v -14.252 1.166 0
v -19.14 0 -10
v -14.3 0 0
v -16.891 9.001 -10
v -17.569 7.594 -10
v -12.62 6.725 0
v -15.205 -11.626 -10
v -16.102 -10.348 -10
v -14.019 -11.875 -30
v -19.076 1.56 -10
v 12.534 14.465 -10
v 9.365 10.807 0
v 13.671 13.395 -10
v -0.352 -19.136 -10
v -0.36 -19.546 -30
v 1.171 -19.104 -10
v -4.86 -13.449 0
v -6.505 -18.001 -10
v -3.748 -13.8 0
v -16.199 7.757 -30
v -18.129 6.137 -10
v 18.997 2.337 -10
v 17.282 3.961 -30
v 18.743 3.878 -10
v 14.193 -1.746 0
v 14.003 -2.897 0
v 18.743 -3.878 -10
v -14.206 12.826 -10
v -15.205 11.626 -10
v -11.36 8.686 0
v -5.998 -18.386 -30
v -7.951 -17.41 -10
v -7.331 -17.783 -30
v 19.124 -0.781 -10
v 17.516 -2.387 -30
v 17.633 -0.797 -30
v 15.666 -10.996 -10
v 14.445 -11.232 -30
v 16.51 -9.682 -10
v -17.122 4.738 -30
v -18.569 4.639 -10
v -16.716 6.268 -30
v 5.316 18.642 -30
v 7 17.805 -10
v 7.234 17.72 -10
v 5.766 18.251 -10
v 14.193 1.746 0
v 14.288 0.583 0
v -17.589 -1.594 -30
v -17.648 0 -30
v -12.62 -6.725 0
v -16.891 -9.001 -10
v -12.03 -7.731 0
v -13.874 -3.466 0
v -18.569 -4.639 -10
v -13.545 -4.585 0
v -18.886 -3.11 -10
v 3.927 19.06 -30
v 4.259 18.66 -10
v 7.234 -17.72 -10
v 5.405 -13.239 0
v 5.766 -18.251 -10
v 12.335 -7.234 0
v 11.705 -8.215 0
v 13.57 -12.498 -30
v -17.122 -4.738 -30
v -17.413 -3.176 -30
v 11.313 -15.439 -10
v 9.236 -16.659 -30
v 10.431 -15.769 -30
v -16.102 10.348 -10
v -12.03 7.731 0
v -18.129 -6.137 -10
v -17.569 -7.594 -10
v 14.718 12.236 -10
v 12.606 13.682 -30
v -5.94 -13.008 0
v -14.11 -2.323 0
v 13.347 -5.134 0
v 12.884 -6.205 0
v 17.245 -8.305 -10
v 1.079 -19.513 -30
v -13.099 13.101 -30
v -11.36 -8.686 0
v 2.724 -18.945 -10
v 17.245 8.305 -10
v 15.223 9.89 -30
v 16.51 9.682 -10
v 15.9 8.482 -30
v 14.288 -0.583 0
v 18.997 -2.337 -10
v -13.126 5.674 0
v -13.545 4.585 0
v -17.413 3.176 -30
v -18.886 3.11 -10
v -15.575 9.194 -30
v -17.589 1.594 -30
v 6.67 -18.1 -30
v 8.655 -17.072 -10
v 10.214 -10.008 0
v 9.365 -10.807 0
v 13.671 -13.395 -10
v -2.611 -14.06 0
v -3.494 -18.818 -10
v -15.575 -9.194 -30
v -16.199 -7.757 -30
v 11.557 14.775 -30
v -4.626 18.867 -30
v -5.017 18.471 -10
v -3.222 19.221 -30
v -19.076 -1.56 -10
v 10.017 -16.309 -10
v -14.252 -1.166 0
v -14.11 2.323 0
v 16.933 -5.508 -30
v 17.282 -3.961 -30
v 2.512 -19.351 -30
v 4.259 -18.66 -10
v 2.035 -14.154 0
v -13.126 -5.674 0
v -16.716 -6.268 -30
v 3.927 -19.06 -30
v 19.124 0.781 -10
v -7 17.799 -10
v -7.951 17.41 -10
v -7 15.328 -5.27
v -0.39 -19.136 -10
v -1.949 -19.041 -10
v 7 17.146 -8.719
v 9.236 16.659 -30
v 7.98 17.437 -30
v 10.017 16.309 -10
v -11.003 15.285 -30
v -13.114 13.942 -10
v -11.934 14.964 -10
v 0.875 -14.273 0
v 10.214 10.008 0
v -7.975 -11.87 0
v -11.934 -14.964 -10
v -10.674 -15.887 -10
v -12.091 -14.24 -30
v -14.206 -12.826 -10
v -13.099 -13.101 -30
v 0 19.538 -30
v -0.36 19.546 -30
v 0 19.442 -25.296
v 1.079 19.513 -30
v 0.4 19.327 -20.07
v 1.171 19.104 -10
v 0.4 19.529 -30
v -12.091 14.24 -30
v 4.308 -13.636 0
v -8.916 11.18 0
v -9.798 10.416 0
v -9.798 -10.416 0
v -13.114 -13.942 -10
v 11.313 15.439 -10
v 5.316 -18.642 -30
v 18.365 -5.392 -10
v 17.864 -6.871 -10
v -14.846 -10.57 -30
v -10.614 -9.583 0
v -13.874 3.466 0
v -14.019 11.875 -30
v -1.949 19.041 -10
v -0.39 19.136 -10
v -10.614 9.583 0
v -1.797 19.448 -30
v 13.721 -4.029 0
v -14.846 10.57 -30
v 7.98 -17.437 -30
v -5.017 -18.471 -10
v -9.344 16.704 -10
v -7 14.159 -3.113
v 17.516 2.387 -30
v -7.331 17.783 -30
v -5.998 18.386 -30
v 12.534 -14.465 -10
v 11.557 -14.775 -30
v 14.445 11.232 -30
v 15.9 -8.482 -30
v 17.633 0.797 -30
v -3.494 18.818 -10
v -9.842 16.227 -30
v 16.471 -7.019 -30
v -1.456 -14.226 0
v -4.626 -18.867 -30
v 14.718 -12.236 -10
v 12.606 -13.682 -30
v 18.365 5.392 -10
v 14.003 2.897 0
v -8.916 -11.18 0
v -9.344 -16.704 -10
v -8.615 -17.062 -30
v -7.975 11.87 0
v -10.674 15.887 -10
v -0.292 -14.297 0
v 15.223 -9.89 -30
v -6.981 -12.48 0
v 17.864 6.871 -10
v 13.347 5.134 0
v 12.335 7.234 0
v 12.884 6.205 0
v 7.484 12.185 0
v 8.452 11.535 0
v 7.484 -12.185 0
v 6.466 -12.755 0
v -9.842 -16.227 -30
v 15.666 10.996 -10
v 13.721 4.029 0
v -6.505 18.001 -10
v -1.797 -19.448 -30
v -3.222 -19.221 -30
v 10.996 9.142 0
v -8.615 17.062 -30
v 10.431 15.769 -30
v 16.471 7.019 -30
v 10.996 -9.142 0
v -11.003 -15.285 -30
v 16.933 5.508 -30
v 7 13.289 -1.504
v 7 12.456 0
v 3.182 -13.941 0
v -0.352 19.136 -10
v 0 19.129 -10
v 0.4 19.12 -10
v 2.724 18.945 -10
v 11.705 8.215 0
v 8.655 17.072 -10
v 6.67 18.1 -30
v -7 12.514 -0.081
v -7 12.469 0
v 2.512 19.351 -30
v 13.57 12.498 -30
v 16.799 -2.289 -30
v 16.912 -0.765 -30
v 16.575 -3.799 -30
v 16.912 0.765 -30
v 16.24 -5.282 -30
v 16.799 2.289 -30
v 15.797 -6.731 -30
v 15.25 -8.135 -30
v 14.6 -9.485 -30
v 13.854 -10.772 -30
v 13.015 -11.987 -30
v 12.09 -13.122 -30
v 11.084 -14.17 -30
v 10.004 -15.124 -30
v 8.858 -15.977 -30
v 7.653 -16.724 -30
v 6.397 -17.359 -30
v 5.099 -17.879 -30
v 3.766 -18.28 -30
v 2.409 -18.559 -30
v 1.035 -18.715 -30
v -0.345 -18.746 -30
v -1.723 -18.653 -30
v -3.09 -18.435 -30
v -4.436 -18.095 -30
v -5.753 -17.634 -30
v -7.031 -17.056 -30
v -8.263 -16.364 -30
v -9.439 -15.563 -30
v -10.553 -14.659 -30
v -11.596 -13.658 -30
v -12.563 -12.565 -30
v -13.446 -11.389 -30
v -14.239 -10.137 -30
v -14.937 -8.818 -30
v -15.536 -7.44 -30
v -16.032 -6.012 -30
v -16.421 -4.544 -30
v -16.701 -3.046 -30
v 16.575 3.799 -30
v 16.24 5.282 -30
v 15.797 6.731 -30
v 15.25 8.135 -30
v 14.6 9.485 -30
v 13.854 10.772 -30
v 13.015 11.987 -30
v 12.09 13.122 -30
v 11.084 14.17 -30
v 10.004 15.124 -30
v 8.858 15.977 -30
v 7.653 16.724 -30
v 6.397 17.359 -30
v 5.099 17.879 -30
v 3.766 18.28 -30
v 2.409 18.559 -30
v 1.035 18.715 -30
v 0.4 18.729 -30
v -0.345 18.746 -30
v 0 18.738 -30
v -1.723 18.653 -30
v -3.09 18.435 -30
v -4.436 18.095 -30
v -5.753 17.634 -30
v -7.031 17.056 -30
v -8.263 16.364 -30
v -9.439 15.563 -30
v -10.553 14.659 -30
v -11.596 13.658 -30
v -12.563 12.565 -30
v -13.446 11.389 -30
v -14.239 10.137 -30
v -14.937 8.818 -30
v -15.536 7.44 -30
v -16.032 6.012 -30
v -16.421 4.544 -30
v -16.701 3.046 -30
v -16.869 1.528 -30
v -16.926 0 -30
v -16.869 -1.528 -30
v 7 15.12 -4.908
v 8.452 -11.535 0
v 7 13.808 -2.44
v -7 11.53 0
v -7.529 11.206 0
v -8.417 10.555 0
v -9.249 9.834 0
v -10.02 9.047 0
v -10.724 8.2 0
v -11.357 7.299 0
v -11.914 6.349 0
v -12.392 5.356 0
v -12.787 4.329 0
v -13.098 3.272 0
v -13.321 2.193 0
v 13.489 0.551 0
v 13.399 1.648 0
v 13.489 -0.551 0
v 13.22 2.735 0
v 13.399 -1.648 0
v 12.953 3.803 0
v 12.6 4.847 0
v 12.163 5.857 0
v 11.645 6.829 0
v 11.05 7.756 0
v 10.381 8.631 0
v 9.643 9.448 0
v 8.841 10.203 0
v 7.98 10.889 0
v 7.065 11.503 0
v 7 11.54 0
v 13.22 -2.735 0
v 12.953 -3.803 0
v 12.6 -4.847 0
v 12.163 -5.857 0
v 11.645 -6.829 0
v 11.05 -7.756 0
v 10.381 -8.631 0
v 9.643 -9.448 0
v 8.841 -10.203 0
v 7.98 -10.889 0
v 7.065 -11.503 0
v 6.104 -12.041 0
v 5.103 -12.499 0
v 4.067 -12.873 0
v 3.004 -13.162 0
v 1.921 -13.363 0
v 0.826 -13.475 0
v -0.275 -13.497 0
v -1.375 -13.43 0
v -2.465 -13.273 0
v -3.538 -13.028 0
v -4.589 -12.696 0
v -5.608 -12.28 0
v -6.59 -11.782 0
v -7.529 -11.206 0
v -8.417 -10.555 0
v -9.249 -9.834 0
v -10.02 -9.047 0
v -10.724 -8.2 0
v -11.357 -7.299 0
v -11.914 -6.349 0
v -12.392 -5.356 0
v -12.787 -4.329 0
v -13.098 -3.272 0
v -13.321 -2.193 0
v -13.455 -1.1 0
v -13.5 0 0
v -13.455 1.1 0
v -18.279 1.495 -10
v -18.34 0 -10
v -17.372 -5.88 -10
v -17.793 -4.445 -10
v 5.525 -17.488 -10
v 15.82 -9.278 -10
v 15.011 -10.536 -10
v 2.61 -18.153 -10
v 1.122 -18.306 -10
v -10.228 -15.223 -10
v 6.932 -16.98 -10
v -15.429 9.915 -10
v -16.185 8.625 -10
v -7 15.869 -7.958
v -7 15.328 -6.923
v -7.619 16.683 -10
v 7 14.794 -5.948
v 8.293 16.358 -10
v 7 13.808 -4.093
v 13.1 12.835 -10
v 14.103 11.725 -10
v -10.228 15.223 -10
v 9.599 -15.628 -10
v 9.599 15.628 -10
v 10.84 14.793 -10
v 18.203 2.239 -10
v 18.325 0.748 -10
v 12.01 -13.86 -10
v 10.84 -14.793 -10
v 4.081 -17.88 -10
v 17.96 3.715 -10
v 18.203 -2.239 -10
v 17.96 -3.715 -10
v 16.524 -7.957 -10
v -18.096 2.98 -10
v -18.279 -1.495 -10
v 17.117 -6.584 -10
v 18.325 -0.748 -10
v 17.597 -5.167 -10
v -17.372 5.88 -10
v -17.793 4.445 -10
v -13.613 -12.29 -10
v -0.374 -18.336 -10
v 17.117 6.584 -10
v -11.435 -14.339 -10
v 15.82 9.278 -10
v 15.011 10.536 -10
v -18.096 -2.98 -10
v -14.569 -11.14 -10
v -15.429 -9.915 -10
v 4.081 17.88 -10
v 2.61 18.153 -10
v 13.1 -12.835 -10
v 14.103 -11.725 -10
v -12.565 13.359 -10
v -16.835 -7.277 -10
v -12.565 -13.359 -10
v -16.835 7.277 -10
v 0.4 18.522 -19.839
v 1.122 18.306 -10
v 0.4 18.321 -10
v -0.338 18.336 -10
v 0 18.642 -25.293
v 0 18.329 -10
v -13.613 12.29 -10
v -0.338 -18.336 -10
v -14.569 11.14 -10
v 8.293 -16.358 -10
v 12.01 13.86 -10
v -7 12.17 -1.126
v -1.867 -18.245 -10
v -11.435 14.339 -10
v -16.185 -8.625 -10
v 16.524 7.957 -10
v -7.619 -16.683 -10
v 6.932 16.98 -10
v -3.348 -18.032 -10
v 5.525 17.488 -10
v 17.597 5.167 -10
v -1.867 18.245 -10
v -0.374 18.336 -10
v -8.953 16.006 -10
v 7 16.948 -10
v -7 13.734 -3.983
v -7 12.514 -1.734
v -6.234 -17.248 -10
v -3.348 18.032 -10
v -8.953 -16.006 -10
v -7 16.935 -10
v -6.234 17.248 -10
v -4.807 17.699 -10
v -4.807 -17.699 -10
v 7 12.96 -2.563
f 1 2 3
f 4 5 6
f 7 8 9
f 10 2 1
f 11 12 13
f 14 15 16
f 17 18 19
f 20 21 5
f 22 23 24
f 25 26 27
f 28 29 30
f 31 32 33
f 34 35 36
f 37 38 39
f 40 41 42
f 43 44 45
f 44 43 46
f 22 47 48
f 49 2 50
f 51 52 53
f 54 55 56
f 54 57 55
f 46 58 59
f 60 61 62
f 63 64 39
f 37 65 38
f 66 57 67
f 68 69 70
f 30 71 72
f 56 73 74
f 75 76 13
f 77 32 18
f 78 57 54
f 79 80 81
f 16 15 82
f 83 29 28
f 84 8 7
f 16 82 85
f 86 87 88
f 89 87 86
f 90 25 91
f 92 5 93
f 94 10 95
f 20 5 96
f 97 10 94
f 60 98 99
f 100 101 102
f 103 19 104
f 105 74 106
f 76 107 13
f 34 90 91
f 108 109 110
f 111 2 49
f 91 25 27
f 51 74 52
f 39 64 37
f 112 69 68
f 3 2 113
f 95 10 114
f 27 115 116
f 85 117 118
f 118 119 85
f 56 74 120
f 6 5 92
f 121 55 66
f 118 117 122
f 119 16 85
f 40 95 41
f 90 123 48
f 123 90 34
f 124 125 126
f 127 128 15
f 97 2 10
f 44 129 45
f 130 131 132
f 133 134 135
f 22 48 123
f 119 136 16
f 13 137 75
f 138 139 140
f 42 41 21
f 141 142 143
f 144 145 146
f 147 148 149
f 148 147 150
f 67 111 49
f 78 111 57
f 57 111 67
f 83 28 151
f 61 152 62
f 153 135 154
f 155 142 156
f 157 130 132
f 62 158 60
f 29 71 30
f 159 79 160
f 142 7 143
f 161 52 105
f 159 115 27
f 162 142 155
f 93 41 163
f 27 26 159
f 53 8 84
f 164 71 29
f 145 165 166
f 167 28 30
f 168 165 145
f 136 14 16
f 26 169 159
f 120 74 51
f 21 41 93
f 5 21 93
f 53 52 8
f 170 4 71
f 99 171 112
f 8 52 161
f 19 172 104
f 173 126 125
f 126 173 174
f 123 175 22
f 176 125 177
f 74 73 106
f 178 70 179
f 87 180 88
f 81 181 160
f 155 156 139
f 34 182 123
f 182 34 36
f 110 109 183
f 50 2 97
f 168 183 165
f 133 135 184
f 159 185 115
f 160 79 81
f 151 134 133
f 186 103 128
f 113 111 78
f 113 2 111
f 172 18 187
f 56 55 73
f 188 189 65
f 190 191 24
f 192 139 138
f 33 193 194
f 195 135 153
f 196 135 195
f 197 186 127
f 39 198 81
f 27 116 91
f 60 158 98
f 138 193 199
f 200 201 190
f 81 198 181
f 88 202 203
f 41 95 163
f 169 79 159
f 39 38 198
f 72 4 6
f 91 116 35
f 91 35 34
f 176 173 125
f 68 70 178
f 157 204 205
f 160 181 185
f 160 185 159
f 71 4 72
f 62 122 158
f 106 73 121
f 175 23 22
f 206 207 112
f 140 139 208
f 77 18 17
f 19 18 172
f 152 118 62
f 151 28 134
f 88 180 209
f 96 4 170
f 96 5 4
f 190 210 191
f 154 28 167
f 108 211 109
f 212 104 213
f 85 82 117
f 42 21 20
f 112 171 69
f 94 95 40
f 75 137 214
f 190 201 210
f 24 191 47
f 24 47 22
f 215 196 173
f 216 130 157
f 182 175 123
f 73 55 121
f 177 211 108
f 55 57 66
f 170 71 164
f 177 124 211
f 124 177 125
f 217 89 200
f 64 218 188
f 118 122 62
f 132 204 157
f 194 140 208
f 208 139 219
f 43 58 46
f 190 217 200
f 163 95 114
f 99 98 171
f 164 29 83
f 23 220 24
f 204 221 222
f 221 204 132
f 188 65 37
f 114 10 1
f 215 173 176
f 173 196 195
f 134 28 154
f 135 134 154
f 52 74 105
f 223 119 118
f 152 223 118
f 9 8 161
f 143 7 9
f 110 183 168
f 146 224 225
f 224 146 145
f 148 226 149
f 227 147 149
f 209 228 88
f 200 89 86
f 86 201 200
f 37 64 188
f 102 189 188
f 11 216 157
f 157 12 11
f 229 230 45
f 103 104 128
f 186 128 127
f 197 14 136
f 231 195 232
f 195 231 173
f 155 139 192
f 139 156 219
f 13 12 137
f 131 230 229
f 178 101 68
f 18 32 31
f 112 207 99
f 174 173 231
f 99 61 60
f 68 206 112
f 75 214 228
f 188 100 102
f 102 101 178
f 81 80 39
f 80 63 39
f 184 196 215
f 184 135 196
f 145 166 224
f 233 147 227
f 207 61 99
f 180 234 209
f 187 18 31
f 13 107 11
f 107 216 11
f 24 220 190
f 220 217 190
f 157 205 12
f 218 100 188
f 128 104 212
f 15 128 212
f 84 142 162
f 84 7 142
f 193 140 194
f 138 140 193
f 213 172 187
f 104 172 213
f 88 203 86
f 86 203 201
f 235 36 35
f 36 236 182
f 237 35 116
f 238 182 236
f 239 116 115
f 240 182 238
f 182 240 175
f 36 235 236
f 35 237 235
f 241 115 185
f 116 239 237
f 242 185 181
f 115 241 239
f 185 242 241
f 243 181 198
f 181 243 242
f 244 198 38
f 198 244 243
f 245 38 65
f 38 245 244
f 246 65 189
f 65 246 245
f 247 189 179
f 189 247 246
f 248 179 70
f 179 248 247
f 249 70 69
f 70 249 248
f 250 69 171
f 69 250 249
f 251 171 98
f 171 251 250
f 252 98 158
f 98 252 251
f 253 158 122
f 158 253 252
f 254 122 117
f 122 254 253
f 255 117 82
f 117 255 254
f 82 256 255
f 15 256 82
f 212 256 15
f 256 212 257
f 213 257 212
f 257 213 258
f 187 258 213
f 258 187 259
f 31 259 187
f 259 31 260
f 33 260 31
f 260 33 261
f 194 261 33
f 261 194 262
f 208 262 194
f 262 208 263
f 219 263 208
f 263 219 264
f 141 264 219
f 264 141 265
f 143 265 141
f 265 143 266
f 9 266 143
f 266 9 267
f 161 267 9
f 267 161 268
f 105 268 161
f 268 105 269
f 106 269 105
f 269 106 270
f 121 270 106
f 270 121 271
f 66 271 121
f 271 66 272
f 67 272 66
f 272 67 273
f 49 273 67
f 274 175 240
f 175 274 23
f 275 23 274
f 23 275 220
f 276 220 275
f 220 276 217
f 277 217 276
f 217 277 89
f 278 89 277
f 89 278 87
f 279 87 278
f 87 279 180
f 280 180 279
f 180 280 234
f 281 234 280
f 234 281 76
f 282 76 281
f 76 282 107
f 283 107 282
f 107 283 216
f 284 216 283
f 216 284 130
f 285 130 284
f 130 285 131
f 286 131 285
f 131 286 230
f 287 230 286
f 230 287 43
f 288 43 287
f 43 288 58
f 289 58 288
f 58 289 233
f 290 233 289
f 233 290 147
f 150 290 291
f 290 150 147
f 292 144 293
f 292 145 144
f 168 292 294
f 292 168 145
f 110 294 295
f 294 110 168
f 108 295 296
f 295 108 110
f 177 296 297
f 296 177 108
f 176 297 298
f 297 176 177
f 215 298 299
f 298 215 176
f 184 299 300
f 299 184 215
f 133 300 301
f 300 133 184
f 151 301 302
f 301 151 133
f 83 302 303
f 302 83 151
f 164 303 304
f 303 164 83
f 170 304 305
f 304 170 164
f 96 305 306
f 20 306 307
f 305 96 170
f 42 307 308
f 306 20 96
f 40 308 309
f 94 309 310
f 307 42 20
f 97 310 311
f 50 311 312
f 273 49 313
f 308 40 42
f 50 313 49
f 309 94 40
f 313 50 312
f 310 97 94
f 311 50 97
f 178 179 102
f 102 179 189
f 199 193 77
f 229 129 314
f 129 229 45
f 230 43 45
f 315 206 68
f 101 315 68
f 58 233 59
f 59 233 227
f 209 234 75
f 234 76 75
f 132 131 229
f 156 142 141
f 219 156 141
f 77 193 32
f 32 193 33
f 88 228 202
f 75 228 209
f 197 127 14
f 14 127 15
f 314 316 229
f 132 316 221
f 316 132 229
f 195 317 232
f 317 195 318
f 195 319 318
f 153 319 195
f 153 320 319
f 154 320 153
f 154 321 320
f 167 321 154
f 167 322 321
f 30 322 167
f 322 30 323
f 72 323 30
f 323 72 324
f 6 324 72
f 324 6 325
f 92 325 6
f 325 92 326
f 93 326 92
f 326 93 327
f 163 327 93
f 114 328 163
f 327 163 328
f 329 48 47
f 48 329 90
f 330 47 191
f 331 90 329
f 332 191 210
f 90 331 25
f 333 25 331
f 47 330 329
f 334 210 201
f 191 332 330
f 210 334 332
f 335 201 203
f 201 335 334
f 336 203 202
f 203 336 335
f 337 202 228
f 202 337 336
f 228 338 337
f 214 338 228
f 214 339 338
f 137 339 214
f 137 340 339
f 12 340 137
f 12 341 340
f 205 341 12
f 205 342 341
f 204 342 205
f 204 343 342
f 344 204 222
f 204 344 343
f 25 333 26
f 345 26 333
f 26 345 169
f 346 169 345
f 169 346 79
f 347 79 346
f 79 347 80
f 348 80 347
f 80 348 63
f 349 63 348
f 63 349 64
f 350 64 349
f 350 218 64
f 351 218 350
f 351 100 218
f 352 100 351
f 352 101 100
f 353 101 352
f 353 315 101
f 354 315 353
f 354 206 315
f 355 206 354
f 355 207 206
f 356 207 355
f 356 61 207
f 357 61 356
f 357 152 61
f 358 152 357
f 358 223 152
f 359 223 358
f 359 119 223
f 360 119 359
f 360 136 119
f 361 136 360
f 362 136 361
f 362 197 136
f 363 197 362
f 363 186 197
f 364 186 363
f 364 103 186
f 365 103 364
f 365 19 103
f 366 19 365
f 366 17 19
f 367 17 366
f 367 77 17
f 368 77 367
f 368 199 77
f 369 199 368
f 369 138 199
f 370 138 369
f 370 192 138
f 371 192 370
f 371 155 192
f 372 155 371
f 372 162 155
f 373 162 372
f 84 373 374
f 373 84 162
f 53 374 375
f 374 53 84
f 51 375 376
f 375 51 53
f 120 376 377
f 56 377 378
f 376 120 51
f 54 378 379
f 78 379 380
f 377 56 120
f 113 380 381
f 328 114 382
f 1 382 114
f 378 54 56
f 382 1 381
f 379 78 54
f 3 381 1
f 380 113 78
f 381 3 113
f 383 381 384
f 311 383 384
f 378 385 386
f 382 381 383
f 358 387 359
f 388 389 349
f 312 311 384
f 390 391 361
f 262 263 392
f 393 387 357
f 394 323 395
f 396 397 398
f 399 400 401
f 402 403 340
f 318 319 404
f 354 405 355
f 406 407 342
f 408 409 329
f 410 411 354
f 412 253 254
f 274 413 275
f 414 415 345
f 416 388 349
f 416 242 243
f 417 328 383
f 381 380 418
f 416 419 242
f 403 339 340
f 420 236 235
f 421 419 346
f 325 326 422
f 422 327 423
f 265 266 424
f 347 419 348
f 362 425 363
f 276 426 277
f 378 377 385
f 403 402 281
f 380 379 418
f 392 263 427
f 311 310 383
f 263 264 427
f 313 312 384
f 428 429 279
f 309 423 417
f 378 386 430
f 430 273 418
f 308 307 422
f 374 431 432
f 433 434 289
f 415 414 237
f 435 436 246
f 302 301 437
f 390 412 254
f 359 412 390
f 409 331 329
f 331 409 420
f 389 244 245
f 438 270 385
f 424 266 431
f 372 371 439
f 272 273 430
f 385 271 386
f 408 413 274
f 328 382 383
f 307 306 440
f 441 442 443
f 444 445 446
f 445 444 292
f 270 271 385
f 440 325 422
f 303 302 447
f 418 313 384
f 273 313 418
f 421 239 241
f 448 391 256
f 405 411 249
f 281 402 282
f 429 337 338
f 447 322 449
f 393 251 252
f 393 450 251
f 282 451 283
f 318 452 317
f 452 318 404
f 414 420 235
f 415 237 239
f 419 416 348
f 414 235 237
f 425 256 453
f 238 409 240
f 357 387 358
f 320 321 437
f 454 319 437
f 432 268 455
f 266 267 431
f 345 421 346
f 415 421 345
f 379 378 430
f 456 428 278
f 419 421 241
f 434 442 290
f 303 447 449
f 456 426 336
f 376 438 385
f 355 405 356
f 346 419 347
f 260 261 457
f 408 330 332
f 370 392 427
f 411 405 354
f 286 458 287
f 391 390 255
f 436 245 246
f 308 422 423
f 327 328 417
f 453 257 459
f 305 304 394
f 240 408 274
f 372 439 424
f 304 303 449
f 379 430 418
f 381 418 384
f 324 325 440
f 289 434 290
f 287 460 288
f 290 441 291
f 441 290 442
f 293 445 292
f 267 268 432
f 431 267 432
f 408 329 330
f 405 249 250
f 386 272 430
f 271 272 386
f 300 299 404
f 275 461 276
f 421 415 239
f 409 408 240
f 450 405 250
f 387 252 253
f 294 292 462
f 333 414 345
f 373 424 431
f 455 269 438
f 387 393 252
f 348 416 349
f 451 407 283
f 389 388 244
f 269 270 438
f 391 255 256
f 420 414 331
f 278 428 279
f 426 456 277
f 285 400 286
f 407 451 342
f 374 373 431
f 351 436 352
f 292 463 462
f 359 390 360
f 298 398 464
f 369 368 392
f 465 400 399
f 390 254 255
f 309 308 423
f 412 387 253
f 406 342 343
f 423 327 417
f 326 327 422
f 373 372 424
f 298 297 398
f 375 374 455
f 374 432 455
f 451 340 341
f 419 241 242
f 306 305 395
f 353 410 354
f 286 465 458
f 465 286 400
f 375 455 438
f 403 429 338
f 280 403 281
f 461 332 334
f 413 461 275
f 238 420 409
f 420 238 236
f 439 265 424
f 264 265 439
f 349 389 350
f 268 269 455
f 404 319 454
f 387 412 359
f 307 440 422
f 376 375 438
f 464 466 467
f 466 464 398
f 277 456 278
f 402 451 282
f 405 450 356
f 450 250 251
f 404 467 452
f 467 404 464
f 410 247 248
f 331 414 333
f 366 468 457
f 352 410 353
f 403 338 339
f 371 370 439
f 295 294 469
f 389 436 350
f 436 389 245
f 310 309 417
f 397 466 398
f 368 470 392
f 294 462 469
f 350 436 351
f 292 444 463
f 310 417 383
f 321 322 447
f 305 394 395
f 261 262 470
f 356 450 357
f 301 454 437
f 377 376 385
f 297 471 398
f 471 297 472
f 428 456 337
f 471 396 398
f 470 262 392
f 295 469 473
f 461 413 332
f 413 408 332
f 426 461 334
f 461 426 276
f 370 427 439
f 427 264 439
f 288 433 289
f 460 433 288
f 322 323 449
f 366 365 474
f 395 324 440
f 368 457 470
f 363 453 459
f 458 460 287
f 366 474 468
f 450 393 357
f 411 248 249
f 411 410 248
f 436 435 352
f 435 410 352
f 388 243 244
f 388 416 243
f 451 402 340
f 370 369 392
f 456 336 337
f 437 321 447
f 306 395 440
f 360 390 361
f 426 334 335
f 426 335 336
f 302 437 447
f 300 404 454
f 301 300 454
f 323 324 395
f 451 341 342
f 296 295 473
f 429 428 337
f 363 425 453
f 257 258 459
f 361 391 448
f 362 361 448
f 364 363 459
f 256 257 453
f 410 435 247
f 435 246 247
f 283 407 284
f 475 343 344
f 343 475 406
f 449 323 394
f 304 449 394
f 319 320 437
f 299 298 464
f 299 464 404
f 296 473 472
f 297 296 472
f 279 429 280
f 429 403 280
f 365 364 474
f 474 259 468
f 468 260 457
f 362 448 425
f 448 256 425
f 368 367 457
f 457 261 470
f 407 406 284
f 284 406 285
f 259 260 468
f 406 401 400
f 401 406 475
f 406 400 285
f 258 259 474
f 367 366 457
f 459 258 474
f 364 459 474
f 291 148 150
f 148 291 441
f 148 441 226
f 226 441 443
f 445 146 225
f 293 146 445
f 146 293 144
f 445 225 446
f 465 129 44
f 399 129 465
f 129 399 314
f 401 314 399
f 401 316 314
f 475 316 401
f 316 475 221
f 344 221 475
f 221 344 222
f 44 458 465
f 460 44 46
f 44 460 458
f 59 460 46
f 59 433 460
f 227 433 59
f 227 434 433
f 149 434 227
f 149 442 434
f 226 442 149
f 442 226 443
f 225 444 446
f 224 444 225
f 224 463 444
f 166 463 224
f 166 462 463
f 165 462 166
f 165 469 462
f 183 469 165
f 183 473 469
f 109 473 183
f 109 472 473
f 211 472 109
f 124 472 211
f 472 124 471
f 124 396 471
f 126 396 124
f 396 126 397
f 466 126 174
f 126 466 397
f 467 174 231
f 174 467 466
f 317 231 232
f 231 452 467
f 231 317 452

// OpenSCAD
fn=77;

difference()
{
    xxx(0.4*2);
    xxx();
    translate([0,0,-35])
    cube([0.4,30,40]);
    translate([-7,0,-10])
    cube([14,30,11]);
}

module xxx(w=0)
{
    //c=3;//1.6;
    w=2*w;
    rotate([0,180,0])
    hull()
    {
        cylinder(d1=27+w,d2=37+w-0.32,h=10,$fn=fn);
        scale([(33.4)/(37),1,1])
        {
            translate([0,0,10])
            cylinder(d1=37+w-0.32,d2=35.5+2+w,h=20,$fn=fn);
        }
    }
}
